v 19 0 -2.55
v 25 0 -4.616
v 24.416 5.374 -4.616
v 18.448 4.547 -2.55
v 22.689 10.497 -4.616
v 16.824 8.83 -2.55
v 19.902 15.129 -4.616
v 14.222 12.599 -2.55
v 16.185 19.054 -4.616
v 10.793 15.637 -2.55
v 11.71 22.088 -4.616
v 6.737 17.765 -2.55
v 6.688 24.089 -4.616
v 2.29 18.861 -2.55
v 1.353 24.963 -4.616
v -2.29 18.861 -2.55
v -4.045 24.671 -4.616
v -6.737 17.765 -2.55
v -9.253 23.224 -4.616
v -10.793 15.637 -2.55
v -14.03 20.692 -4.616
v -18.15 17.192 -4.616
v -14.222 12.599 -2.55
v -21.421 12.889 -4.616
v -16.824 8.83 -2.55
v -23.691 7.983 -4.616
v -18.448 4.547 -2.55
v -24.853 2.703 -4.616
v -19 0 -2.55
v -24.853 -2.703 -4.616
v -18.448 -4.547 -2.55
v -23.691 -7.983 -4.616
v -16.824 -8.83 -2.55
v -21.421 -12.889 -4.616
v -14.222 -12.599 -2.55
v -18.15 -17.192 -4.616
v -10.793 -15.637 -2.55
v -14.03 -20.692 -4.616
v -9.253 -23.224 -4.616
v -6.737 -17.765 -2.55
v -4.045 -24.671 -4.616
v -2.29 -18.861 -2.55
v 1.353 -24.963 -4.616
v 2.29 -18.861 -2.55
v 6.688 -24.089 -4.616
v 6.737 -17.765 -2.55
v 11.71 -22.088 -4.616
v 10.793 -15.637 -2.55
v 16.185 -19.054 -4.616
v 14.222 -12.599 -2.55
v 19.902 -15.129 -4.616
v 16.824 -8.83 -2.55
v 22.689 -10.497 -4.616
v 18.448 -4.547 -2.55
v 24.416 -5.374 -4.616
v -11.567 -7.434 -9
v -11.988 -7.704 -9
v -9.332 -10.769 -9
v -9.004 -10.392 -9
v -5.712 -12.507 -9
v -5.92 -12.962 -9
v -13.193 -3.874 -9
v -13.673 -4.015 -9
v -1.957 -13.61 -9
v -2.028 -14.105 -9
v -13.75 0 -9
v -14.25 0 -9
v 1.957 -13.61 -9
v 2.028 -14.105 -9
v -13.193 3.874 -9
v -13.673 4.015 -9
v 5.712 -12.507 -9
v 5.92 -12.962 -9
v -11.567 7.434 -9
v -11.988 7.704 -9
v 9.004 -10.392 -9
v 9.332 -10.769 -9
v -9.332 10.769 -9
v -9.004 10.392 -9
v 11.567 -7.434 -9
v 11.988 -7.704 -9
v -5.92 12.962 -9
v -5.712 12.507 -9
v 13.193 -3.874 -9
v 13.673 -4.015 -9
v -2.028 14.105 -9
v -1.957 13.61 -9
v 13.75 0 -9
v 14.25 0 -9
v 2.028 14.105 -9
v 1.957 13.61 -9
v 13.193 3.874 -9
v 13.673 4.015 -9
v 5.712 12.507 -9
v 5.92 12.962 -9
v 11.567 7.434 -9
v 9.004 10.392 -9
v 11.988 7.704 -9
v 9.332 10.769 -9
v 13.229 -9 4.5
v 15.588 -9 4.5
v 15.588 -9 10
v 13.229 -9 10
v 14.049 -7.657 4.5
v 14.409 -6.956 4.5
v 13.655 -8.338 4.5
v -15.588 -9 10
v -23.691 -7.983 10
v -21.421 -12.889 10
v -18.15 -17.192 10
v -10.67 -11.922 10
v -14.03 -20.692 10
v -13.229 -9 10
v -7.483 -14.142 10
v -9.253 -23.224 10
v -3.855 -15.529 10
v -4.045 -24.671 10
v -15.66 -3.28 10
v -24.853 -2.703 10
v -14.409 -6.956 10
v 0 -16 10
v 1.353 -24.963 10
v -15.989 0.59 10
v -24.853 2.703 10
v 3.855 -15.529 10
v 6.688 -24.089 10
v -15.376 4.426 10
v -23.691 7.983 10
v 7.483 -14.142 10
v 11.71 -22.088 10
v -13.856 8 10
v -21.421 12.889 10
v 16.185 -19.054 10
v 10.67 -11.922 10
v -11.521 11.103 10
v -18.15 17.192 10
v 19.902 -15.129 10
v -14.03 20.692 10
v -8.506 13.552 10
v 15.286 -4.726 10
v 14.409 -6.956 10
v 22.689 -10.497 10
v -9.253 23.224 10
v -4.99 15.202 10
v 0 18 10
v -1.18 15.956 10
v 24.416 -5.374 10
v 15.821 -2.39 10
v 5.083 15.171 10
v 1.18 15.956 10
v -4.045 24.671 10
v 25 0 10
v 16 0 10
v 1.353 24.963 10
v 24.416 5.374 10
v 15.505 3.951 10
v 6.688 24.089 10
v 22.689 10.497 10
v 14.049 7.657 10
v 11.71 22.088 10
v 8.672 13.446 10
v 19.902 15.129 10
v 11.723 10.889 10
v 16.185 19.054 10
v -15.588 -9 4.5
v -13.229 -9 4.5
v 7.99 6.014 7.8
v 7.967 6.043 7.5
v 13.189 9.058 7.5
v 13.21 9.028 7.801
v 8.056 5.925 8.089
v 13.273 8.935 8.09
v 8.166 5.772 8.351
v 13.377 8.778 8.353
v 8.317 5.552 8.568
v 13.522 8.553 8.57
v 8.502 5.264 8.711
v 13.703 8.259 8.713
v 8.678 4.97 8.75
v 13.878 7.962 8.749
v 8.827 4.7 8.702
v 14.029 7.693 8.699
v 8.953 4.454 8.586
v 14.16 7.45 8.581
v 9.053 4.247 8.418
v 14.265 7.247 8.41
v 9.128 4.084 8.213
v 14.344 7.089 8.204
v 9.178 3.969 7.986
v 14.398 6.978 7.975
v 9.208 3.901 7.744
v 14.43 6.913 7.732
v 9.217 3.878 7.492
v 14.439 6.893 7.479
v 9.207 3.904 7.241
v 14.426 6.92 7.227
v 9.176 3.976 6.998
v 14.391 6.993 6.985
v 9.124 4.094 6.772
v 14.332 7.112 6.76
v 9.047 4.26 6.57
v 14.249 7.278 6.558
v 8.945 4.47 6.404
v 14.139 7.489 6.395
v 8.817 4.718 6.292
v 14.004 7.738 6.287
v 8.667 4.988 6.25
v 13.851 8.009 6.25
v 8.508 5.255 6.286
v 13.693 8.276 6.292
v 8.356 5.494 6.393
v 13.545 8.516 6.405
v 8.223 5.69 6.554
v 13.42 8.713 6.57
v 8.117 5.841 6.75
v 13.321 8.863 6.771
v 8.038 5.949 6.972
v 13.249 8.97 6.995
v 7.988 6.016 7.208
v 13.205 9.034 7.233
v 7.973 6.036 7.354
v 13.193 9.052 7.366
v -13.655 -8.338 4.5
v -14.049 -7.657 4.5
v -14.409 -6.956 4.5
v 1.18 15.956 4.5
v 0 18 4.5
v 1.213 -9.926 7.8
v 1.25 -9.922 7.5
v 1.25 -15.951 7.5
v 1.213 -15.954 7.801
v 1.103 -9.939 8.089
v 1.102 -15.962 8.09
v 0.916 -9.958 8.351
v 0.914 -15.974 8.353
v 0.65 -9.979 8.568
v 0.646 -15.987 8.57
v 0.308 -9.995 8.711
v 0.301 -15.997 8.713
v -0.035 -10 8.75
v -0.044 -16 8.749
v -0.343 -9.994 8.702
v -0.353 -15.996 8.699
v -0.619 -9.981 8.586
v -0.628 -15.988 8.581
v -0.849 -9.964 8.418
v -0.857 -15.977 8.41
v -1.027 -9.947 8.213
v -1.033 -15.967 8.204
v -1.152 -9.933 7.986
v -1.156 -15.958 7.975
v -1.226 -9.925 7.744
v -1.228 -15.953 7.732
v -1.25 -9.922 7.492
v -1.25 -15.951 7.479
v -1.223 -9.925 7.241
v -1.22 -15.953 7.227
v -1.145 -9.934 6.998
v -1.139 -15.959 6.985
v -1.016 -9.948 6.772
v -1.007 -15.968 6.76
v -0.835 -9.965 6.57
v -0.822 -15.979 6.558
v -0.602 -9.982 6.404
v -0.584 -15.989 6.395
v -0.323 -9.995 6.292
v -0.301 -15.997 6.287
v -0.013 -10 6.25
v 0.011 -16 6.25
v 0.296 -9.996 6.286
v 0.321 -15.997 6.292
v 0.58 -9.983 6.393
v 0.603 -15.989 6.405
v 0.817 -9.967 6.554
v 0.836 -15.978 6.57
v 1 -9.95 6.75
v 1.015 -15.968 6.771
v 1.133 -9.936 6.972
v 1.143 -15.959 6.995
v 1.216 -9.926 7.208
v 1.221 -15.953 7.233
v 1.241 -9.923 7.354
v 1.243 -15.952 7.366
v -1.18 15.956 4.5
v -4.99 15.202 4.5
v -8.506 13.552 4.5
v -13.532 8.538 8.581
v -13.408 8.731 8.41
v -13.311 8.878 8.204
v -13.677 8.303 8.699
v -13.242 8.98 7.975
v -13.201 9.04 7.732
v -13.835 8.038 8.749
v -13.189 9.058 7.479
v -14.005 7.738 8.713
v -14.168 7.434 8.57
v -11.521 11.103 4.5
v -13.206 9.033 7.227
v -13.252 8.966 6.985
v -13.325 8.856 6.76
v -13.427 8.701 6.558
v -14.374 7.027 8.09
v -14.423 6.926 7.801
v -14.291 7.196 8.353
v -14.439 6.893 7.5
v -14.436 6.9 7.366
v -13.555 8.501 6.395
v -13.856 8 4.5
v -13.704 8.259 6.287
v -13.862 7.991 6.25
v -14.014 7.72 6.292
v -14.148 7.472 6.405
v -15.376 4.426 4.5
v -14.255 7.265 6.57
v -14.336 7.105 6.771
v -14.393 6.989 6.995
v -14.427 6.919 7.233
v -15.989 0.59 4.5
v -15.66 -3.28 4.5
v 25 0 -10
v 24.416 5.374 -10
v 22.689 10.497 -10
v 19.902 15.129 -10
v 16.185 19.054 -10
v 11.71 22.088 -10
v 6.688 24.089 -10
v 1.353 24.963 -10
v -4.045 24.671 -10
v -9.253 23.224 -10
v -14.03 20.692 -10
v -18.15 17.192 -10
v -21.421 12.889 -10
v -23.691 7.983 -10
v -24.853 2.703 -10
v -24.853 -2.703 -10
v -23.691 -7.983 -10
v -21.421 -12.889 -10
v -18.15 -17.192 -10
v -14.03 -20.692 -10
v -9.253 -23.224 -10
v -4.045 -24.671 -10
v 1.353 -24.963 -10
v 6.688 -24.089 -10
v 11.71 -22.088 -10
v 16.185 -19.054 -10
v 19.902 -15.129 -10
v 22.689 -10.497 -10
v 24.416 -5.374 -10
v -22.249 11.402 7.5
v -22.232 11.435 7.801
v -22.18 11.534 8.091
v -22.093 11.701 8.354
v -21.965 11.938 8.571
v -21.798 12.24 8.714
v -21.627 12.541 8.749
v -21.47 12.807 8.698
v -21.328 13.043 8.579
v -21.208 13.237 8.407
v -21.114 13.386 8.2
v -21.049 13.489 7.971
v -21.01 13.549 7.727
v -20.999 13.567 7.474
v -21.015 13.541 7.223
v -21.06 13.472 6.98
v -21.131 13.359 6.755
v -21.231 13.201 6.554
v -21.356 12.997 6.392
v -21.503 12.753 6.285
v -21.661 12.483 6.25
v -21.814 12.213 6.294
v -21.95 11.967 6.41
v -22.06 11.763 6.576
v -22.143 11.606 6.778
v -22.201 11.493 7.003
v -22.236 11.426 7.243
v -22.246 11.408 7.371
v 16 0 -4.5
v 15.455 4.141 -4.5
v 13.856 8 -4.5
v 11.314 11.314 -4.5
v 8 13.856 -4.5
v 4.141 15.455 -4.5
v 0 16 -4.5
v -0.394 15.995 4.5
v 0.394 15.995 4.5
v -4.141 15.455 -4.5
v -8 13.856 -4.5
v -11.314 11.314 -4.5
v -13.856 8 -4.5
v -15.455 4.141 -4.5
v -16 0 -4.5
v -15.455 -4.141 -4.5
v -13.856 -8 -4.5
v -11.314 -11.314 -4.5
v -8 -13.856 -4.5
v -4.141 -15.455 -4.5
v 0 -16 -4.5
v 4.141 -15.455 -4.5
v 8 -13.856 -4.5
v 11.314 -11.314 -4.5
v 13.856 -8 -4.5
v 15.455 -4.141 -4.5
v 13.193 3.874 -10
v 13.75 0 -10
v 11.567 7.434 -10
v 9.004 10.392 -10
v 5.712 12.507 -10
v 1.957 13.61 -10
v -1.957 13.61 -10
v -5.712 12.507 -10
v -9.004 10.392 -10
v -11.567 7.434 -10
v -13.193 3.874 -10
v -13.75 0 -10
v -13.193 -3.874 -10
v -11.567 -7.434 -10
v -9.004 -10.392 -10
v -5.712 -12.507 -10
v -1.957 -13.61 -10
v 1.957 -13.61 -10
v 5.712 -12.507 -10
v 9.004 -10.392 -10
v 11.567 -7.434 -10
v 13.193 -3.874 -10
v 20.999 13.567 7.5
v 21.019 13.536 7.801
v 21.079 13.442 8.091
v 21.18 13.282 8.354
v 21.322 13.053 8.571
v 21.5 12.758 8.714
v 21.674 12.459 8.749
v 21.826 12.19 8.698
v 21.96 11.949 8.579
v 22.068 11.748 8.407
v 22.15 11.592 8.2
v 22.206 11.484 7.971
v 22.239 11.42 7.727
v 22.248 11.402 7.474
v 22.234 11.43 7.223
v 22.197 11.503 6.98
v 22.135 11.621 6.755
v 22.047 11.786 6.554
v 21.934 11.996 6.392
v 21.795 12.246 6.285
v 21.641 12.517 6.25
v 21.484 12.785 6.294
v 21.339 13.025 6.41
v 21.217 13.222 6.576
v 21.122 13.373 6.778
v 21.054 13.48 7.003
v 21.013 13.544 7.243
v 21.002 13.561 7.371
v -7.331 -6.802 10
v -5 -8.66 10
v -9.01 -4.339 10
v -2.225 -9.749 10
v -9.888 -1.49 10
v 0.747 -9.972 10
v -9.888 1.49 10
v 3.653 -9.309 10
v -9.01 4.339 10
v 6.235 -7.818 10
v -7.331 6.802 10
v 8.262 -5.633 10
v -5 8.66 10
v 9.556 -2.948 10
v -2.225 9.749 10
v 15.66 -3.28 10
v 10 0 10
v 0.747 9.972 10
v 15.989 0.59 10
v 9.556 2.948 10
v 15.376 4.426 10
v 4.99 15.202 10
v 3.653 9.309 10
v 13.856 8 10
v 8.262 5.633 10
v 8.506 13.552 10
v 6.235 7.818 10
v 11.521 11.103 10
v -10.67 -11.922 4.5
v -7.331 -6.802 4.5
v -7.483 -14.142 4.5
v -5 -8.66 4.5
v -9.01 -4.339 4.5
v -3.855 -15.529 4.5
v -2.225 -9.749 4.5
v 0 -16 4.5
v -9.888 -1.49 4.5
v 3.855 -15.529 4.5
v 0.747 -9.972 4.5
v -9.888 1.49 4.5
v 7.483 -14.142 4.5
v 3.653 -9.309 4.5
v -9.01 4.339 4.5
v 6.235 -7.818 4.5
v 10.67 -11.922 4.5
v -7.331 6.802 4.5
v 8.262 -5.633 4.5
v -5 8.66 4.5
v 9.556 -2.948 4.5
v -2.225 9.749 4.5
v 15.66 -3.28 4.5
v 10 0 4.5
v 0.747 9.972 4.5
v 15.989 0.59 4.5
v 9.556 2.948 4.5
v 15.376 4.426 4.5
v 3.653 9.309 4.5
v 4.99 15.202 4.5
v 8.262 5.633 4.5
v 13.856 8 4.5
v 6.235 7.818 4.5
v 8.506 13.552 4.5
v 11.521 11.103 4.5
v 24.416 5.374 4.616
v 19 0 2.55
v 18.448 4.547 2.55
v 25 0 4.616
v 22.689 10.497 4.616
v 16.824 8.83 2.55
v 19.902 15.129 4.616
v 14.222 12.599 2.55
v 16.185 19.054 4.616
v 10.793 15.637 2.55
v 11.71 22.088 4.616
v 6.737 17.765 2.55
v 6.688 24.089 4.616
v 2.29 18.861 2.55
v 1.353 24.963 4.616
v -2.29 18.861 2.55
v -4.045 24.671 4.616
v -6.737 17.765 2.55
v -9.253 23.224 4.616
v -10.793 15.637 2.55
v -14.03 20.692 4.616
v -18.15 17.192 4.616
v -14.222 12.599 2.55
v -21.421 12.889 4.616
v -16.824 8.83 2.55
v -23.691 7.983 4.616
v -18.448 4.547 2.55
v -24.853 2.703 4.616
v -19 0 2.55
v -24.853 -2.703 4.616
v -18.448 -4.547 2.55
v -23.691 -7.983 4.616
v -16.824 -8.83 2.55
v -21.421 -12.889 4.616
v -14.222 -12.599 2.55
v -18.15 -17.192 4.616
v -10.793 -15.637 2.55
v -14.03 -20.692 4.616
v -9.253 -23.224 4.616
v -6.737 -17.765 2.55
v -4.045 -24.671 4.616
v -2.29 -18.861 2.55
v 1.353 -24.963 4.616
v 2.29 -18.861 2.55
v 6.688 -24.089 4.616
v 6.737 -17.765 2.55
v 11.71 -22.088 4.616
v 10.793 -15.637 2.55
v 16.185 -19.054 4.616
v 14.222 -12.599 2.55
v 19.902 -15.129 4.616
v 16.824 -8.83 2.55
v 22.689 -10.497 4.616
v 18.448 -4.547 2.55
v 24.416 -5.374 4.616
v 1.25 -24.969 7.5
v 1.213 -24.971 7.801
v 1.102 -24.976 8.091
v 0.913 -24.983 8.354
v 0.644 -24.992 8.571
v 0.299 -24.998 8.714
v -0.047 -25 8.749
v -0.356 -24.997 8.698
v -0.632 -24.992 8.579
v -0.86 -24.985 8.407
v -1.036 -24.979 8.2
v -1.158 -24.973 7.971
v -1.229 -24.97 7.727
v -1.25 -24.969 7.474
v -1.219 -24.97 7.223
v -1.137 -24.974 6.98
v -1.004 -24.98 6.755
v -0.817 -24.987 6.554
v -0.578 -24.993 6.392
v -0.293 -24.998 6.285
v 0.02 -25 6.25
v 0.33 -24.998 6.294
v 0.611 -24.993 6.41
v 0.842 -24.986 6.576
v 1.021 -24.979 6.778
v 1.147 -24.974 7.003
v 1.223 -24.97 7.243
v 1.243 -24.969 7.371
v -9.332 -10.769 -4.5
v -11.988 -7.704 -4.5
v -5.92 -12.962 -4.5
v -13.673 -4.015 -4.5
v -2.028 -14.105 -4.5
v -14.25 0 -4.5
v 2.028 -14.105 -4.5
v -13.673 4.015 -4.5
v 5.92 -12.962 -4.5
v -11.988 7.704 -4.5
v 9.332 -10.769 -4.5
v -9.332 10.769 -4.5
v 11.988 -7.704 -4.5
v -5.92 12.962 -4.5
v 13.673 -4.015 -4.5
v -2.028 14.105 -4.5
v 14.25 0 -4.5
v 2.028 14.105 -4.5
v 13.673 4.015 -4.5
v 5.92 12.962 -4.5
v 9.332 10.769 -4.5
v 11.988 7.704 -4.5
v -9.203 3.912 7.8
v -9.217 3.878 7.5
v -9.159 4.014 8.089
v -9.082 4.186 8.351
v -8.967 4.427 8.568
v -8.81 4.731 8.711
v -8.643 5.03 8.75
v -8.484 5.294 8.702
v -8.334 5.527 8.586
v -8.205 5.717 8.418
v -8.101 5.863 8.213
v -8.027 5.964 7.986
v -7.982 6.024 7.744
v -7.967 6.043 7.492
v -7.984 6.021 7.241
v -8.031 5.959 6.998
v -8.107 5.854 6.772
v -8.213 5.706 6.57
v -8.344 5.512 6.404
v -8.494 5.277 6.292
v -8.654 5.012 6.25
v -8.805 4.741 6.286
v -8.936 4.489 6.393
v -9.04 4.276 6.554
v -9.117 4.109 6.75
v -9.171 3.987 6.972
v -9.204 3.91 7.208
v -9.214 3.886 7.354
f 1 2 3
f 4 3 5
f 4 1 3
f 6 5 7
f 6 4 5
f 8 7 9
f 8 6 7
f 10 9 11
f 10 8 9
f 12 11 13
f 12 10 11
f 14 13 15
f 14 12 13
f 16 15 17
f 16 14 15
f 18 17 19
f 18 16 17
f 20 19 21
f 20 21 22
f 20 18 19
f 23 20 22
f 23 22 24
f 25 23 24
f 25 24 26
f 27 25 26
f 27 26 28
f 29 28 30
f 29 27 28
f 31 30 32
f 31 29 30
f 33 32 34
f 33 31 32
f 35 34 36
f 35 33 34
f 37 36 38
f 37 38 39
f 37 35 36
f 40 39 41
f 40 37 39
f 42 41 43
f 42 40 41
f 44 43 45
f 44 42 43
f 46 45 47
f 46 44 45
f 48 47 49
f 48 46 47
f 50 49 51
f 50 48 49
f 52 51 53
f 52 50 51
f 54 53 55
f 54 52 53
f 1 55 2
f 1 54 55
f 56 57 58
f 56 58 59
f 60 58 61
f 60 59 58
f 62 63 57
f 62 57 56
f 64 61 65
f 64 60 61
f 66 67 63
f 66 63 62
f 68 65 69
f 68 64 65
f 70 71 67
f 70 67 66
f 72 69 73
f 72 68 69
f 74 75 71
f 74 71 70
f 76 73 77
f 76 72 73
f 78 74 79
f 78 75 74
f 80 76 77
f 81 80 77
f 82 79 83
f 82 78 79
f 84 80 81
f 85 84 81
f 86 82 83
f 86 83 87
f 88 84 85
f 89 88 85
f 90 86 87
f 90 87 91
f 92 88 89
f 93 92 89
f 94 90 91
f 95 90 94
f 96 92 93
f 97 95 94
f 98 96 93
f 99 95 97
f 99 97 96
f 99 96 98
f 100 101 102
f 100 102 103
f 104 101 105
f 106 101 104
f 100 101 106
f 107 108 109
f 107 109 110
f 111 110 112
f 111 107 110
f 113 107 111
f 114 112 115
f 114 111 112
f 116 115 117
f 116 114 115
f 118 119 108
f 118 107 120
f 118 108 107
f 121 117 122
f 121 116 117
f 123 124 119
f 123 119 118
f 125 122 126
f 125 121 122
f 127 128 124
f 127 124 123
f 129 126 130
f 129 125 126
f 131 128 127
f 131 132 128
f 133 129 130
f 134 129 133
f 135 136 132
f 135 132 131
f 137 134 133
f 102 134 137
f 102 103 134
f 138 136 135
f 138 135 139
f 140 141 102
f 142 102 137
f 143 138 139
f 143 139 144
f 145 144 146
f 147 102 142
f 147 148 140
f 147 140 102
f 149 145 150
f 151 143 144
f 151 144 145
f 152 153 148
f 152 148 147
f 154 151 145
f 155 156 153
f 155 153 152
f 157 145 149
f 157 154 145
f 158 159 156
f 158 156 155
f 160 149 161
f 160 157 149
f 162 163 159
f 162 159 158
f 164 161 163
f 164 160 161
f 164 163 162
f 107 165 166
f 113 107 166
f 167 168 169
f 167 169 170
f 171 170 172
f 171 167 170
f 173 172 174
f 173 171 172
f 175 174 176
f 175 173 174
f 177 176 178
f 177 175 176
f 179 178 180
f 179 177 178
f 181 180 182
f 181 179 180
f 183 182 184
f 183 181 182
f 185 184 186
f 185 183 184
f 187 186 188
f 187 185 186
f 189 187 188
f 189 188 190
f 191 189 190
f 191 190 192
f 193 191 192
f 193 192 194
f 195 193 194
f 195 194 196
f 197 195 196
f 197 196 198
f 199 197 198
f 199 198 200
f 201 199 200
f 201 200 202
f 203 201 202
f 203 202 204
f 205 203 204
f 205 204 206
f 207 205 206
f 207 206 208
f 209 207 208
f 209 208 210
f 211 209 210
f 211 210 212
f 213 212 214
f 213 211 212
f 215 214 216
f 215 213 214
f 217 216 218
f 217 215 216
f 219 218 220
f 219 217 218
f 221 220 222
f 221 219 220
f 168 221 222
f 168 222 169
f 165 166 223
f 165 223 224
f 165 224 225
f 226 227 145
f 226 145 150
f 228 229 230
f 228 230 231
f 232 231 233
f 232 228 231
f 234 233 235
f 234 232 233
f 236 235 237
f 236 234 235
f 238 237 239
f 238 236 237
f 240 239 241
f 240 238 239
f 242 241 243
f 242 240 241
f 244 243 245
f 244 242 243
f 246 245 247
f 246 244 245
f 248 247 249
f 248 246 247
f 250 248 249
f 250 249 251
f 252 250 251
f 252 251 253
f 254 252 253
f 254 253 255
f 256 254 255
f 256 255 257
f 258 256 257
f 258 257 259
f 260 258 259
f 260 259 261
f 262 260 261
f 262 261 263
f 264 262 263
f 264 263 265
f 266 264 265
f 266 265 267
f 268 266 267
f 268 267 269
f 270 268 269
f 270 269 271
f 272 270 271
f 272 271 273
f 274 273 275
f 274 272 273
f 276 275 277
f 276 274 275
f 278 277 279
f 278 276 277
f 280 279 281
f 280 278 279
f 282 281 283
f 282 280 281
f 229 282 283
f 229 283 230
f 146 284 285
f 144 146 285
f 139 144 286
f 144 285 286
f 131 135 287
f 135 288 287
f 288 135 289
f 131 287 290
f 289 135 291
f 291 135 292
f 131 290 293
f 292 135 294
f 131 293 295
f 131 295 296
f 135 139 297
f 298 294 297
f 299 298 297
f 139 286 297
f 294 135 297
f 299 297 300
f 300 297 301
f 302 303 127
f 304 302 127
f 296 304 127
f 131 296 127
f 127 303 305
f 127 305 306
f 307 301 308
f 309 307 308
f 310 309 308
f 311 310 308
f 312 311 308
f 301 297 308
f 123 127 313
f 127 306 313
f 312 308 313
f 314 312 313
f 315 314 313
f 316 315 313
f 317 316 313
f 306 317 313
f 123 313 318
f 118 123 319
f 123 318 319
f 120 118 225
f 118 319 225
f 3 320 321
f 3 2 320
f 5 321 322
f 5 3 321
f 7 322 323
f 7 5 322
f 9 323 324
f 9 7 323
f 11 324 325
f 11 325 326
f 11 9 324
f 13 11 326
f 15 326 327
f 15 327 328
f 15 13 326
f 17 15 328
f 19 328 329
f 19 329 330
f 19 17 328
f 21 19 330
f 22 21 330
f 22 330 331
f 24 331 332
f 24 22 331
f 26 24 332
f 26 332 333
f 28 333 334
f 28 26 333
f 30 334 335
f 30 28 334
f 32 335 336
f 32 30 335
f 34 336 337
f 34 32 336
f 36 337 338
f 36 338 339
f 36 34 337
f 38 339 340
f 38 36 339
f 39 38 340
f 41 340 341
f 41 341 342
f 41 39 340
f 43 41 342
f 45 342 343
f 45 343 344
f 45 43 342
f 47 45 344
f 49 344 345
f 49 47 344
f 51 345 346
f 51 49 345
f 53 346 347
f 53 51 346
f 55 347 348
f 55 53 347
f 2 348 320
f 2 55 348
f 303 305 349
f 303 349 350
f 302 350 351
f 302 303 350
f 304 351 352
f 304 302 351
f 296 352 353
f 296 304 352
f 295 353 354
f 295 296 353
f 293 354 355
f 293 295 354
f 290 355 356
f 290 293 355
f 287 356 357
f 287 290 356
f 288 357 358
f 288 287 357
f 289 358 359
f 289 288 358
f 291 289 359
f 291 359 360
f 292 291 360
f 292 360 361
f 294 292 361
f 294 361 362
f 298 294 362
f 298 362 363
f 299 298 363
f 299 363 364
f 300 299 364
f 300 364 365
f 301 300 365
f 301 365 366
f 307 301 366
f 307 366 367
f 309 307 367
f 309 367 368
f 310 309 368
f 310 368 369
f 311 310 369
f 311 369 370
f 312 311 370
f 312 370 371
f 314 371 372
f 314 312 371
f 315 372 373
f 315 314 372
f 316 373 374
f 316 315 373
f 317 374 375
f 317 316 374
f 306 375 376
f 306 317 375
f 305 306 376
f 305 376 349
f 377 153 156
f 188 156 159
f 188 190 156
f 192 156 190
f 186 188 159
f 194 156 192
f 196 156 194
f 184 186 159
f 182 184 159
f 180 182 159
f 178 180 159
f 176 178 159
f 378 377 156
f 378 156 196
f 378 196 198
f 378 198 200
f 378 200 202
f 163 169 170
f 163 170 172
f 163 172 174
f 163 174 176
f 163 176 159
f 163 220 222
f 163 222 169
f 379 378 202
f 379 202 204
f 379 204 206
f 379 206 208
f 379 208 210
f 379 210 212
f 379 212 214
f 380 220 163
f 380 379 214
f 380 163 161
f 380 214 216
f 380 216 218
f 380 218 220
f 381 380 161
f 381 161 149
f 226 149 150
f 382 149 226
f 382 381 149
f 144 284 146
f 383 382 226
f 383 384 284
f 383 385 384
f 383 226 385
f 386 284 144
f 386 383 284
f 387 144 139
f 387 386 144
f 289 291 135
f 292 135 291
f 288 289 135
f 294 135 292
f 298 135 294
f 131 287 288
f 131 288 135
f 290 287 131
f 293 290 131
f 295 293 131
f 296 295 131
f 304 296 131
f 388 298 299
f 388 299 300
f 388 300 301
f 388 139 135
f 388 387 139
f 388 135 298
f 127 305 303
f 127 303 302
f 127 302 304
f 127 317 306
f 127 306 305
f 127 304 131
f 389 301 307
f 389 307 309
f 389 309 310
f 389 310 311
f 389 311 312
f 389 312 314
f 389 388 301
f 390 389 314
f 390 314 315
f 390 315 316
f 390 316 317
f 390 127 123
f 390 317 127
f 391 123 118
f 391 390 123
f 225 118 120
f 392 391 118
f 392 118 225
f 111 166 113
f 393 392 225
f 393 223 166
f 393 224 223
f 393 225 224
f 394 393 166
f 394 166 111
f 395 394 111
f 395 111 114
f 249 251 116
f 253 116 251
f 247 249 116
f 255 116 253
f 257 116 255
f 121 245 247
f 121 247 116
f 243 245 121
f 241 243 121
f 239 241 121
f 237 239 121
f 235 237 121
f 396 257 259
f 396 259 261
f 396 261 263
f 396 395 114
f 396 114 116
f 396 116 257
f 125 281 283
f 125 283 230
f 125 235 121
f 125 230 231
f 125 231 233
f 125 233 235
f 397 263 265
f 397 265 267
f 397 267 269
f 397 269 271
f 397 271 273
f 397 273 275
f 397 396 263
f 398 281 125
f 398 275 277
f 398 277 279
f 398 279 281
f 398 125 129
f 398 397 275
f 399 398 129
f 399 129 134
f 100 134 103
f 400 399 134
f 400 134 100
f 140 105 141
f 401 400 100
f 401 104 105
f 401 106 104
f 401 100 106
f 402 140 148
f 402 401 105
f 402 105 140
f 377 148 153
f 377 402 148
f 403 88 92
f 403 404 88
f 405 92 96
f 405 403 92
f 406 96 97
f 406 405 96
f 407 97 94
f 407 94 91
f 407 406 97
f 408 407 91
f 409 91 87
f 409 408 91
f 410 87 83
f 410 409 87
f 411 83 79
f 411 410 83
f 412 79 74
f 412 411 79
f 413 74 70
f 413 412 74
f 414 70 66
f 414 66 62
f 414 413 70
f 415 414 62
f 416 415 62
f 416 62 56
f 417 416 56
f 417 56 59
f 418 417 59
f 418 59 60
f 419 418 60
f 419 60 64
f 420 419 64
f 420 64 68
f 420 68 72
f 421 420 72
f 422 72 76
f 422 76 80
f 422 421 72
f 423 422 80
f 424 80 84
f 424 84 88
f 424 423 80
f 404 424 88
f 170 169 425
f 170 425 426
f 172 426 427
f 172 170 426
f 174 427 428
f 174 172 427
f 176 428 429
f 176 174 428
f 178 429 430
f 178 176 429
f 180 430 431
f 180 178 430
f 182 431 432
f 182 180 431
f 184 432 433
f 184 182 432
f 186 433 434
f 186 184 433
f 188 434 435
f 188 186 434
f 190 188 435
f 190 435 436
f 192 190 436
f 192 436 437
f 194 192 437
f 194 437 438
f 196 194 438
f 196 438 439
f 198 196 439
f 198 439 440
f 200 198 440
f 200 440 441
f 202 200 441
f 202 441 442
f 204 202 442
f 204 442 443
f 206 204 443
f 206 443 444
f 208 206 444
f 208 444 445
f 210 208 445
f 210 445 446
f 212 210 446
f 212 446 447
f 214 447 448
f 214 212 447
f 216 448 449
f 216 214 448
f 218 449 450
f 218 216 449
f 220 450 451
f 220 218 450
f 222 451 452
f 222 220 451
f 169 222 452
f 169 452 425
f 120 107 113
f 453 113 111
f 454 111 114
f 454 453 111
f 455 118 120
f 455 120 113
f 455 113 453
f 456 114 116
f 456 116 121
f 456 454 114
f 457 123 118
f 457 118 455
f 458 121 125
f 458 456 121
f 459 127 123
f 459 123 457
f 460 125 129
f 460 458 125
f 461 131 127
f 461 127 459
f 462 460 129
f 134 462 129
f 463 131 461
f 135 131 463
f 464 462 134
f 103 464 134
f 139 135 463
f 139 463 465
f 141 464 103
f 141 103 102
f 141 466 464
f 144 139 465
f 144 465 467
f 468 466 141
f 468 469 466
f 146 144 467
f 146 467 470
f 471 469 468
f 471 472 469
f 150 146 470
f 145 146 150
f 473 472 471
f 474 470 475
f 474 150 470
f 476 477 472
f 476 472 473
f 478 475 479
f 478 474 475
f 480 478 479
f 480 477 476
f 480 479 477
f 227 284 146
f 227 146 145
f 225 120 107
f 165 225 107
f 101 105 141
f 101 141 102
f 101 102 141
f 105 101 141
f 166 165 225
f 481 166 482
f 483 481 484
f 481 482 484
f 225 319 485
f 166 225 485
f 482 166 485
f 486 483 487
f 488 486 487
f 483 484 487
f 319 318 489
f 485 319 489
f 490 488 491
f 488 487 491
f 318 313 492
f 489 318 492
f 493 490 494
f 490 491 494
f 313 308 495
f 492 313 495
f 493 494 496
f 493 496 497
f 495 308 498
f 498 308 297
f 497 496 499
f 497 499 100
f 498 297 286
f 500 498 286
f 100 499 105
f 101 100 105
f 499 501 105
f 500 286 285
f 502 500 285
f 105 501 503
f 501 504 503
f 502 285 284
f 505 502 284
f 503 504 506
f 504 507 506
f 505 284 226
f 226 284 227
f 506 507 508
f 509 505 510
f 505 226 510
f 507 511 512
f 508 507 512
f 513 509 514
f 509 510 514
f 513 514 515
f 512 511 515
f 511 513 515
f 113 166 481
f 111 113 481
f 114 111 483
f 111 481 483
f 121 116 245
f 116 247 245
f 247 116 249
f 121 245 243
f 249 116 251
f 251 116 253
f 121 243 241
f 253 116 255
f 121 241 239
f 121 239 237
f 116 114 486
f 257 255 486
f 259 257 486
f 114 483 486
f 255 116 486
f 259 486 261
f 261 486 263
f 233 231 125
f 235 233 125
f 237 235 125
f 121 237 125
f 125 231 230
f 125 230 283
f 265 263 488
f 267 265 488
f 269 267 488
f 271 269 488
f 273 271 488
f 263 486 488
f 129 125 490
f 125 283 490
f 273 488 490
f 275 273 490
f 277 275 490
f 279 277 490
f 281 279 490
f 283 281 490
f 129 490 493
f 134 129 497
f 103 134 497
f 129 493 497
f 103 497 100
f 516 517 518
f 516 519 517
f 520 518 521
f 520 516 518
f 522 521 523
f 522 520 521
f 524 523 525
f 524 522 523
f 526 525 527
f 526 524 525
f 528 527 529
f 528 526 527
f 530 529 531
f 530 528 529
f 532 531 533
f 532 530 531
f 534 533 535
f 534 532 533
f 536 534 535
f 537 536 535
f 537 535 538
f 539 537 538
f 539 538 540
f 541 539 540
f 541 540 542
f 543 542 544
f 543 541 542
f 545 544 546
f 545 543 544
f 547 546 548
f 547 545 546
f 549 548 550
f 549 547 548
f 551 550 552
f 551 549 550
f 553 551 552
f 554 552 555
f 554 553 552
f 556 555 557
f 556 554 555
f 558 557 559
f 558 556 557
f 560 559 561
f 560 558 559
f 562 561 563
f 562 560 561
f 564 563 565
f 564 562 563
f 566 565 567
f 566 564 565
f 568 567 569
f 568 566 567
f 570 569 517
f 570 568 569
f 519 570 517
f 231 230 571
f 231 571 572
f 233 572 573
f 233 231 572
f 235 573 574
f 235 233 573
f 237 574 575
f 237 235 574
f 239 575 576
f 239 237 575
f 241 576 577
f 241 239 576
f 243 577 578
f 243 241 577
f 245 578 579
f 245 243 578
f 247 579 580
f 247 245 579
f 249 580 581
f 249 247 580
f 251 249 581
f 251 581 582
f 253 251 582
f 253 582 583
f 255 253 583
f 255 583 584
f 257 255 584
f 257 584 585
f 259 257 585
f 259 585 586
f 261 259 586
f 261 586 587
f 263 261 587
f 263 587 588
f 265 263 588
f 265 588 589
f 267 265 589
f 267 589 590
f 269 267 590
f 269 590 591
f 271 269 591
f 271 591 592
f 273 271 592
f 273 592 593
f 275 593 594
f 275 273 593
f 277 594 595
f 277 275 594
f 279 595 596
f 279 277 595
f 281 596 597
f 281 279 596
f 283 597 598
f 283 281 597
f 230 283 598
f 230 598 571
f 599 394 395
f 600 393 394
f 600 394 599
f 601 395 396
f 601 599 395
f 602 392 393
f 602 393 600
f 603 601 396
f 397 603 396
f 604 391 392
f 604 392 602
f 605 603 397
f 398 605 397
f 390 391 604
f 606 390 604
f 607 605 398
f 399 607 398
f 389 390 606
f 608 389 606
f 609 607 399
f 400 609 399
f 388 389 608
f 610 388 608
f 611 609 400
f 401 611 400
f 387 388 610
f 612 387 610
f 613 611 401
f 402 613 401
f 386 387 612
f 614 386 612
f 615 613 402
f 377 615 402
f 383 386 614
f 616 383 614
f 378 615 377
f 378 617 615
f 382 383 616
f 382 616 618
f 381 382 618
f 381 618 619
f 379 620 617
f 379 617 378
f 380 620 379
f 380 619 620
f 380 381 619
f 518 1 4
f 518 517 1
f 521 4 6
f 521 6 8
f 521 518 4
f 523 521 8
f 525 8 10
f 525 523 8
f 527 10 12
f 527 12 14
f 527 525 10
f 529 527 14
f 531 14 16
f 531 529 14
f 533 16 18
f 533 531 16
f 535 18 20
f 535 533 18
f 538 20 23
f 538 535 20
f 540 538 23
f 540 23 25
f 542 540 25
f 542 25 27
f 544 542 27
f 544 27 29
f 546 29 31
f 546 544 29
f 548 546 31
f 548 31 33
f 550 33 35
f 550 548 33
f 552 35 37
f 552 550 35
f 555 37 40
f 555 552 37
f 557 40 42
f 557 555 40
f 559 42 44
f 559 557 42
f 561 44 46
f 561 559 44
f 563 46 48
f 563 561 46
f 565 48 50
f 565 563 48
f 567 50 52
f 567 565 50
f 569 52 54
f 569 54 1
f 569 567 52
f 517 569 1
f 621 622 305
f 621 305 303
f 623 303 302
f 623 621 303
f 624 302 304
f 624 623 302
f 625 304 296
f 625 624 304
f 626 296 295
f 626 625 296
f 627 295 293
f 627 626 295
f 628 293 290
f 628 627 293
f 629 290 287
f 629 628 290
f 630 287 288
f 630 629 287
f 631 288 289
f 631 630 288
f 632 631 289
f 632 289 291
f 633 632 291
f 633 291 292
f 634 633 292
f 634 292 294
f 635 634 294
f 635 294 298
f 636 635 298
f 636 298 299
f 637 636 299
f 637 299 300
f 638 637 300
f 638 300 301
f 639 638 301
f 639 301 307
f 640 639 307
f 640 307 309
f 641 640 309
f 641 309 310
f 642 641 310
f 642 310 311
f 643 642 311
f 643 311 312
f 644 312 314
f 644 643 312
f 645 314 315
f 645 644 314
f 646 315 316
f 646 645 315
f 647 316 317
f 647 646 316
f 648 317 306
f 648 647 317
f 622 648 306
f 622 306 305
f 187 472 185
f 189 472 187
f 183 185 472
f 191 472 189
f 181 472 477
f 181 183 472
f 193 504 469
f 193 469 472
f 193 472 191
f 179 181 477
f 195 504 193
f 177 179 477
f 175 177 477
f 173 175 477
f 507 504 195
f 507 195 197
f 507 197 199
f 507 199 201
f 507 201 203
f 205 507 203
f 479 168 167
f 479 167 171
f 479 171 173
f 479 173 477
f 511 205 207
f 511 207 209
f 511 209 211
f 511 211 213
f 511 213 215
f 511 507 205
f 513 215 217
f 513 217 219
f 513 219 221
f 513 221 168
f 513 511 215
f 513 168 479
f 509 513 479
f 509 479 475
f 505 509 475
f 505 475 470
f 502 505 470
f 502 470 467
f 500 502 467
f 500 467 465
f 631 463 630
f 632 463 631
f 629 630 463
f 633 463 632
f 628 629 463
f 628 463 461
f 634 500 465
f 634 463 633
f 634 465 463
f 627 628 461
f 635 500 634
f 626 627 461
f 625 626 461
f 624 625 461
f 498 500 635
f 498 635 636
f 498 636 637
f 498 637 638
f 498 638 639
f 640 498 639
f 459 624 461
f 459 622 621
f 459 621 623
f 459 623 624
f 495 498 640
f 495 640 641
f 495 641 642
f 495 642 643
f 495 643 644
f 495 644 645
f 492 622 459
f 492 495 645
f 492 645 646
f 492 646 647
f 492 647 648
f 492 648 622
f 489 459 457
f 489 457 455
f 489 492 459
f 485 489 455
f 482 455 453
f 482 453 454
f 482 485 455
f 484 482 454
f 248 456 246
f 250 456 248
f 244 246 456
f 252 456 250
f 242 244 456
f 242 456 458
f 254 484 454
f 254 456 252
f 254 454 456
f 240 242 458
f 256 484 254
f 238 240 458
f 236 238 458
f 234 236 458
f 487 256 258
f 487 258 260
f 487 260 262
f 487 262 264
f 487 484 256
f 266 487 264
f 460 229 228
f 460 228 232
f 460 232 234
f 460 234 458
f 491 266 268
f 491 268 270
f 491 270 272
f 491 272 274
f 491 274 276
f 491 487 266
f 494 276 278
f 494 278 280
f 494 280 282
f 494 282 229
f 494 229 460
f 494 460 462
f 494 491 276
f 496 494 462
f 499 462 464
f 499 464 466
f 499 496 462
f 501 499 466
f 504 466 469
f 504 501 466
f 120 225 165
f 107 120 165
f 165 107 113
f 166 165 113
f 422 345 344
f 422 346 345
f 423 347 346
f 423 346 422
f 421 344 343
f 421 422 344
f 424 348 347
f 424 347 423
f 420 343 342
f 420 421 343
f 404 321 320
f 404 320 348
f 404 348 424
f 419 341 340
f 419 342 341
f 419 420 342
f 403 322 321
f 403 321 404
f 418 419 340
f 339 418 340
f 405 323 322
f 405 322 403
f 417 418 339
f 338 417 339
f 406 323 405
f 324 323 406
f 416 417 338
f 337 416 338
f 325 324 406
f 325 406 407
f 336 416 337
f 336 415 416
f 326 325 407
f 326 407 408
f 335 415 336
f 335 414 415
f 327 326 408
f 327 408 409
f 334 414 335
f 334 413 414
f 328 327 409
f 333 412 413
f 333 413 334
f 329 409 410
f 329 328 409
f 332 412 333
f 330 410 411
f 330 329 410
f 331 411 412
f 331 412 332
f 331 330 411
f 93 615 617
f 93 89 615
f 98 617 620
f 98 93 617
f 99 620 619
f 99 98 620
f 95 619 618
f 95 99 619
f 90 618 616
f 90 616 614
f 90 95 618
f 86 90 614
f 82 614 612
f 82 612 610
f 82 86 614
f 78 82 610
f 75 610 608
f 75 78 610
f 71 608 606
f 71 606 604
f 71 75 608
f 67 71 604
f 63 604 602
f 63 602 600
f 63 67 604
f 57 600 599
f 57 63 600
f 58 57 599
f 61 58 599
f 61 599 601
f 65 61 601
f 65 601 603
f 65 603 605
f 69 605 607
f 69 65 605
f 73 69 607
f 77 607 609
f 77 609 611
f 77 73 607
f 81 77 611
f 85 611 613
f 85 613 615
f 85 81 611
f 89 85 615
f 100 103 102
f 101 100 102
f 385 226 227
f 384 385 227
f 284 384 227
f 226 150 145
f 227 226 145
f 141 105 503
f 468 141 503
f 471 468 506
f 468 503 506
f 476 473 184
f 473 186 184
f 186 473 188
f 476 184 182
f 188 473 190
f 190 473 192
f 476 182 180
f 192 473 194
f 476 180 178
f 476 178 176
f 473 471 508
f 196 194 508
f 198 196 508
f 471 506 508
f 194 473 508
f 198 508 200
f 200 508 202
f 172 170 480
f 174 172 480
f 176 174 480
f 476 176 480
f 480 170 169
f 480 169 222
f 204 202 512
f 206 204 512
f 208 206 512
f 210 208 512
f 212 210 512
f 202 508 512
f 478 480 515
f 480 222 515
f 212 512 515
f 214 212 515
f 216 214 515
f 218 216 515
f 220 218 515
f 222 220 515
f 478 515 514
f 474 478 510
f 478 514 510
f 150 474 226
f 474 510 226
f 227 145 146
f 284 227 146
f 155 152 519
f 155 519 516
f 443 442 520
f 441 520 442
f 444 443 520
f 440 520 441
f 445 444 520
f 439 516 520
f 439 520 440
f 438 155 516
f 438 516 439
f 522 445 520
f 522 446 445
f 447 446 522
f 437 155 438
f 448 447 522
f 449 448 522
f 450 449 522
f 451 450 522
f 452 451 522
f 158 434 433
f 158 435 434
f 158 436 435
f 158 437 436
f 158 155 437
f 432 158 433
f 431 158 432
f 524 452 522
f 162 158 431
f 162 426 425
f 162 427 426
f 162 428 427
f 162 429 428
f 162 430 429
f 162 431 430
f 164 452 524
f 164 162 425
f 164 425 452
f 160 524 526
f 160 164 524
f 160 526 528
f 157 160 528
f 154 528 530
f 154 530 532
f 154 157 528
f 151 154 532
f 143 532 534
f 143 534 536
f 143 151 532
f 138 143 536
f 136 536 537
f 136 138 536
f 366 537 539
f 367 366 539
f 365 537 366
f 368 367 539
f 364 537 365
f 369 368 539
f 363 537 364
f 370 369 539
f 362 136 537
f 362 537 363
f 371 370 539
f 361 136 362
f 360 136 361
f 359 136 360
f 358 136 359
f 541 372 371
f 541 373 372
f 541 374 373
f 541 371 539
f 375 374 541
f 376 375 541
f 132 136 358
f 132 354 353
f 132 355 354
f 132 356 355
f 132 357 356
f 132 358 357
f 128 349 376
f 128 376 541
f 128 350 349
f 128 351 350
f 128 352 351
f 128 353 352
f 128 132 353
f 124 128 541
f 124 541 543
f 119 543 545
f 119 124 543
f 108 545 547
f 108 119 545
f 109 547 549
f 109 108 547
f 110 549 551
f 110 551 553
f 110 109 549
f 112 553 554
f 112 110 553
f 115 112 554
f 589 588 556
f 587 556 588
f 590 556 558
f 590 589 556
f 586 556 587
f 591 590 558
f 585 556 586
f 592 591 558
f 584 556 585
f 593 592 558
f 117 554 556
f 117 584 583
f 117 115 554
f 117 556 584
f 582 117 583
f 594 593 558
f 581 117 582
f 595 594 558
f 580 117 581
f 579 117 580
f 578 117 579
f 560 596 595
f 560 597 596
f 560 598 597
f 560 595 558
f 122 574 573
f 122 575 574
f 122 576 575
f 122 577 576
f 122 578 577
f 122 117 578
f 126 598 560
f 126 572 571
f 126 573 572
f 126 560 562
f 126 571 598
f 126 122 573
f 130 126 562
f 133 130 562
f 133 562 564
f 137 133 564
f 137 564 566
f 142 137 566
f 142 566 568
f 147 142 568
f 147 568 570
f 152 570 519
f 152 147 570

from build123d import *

# Parameters (mm, degrees)
CYLINDER002_R               = 1.25
CYLINDER002_DEPTH           = 20
CYLINDER002_ROLL_ANGLE      = 90
CYLINDER002_PLACEMENT_ANGLE = 120
CYLINDER001_R               = 1.25
CYLINDER001_DEPTH           = 20
CYLINDER001_ROLL_ANGLE      = 90
CYLINDER001_PLACEMENT_ANGLE = -120
CYLINDER_R                  = 1.25
CYLINDER_DEPTH              = 20
CYLINDER_ROLL_ANGLE         = 90
SKETCH004_R                 = 10
PAD_DEPTH                   = 5.5
POCKET_DEPTH                = 5.5


with BuildPart() as c_righthole_cylinder:
    # Cylinder002 → Cylinder002 (new body)
    with BuildSketch(Plane.XY):
        Circle(CYLINDER002_R)
    extrude(amount=CYLINDER002_DEPTH)


with BuildPart() as c_righthole_cylinder_1:
    # Cylinder002 roll: moved
    add(c_righthole_cylinder.part.rotate(Axis((0, 0, 0), (1, 0, 0)), CYLINDER002_ROLL_ANGLE))


with BuildPart() as c_righthole_cylinder_2:
    # Cylinder002 placement: moved
    add(c_righthole_cylinder_1.part.moved(Location((6.495191, 3.75, 7.5))).rotate(Axis((6.495191, 3.75, 7.5), (0, 0, 1)), CYLINDER002_PLACEMENT_ANGLE))


with BuildPart() as b_lefthole_cylinder:
    # Cylinder001 → Cylinder001 (new body)
    with BuildSketch(Plane.XY):
        Circle(CYLINDER001_R)
    extrude(amount=CYLINDER001_DEPTH)


with BuildPart() as b_lefthole_cylinder_1:
    # Cylinder001 roll: moved
    add(b_lefthole_cylinder.part.rotate(Axis((0, 0, 0), (1, 0, 0)), CYLINDER001_ROLL_ANGLE))


with BuildPart() as b_lefthole_cylinder_2:
    # Cylinder001 placement: moved
    add(b_lefthole_cylinder_1.part.moved(Location((-6.495191, 3.75, 7.5))).rotate(Axis((-6.495191, 3.75, 7.5), (0, 0, 1)), CYLINDER001_PLACEMENT_ANGLE))


with BuildPart() as a_fronthole_cylinder:
    # Cylinder → Cylinder (new body)
    with BuildSketch(Plane.XY):
        Circle(CYLINDER_R)
    extrude(amount=CYLINDER_DEPTH)


with BuildPart() as a_fronthole_cylinder_1:
    # Cylinder roll: moved
    add(a_fronthole_cylinder.part.rotate(Axis((0, 0, 0), (1, 0, 0)), CYLINDER_ROLL_ANGLE))


with BuildPart() as a_fronthole_cylinder_2:
    # Cylinder placement: moved
    add(a_fronthole_cylinder_1.part.moved(Location((0, -7.5, 7.5))))


with BuildPart() as f_4_ringrighthole_cut:
    # Sketch004 → Pad (new body)
    with BuildSketch(Plane.XY.offset(4.5)):
        with BuildLine():
            ThreePointArc((14.408607, -6.956439), (13.856406, 8), (1.17985, 15.956439))
            Line((0, 18), (1.17985, 15.956439))
            Line((-1.17985, 15.956439), (0, 18))
            ThreePointArc((-1.17985, 15.956439), (-13.856406, 8), (-14.408607, -6.956439))
            Line((-14.408607, -6.956439), (-15.588457, -9))
            Line((-15.588457, -9), (-13.228757, -9))
            ThreePointArc((-13.228757, -9), (0, -16), (13.228757, -9))
            Line((15.588457, -9), (13.228757, -9))
            Line((14.408607, -6.956439), (15.588457, -9))
        make_face()
        Circle(SKETCH004_R, mode=Mode.SUBTRACT)
    extrude(amount=PAD_DEPTH)

    # Cut: cut A_FrontHole_Cylinder
    add(a_fronthole_cylinder_2.part, mode=Mode.SUBTRACT)

    # Cut001: cut B_LeftHole_Cylinder
    add(b_lefthole_cylinder_2.part, mode=Mode.SUBTRACT)

    # Cut002: cut C_RightHole_Cylinder
    add(c_righthole_cylinder_2.part, mode=Mode.SUBTRACT)


with BuildPart() as f_4_bodyrighthole_cut:
    # Sketch → Revolution001 (revolve)
    with BuildSketch(Plane.XZ):
        Polygon((13.75, -10), (25, -10), (25, -4.615966), (19, -2.55), (19, 2.55), (25, 4.615966), (25, 10), (16, 10), (16, -4.5), (14.25, -4.5), (14.25, -9), (13.75, -9), align=None)
    revolve(axis=Axis((0, 0, 0), (0, 0, 1)))

    # Sketch005 → Pocket (cut)
    with BuildSketch(Plane(origin=(0, 0, 10), x_dir=(-1, 0, 0), z_dir=(0, 0, 1))):
        Polygon((0, -18), (15.588457, 9), (-15.588457, 9), align=None)
    extrude(amount=-POCKET_DEPTH, mode=Mode.SUBTRACT)

    # Cut003: cut A_FrontHole_Cylinder
    add(a_fronthole_cylinder_2.part, mode=Mode.SUBTRACT)

    # Cut004: cut B_LeftHole_Cylinder
    add(b_lefthole_cylinder_2.part, mode=Mode.SUBTRACT)

    # Cut005: cut C_RightHole_Cylinder
    add(c_righthole_cylinder_2.part, mode=Mode.SUBTRACT)


solid = Compound([f_4_ringrighthole_cut.part, f_4_bodyrighthole_cut.part])
